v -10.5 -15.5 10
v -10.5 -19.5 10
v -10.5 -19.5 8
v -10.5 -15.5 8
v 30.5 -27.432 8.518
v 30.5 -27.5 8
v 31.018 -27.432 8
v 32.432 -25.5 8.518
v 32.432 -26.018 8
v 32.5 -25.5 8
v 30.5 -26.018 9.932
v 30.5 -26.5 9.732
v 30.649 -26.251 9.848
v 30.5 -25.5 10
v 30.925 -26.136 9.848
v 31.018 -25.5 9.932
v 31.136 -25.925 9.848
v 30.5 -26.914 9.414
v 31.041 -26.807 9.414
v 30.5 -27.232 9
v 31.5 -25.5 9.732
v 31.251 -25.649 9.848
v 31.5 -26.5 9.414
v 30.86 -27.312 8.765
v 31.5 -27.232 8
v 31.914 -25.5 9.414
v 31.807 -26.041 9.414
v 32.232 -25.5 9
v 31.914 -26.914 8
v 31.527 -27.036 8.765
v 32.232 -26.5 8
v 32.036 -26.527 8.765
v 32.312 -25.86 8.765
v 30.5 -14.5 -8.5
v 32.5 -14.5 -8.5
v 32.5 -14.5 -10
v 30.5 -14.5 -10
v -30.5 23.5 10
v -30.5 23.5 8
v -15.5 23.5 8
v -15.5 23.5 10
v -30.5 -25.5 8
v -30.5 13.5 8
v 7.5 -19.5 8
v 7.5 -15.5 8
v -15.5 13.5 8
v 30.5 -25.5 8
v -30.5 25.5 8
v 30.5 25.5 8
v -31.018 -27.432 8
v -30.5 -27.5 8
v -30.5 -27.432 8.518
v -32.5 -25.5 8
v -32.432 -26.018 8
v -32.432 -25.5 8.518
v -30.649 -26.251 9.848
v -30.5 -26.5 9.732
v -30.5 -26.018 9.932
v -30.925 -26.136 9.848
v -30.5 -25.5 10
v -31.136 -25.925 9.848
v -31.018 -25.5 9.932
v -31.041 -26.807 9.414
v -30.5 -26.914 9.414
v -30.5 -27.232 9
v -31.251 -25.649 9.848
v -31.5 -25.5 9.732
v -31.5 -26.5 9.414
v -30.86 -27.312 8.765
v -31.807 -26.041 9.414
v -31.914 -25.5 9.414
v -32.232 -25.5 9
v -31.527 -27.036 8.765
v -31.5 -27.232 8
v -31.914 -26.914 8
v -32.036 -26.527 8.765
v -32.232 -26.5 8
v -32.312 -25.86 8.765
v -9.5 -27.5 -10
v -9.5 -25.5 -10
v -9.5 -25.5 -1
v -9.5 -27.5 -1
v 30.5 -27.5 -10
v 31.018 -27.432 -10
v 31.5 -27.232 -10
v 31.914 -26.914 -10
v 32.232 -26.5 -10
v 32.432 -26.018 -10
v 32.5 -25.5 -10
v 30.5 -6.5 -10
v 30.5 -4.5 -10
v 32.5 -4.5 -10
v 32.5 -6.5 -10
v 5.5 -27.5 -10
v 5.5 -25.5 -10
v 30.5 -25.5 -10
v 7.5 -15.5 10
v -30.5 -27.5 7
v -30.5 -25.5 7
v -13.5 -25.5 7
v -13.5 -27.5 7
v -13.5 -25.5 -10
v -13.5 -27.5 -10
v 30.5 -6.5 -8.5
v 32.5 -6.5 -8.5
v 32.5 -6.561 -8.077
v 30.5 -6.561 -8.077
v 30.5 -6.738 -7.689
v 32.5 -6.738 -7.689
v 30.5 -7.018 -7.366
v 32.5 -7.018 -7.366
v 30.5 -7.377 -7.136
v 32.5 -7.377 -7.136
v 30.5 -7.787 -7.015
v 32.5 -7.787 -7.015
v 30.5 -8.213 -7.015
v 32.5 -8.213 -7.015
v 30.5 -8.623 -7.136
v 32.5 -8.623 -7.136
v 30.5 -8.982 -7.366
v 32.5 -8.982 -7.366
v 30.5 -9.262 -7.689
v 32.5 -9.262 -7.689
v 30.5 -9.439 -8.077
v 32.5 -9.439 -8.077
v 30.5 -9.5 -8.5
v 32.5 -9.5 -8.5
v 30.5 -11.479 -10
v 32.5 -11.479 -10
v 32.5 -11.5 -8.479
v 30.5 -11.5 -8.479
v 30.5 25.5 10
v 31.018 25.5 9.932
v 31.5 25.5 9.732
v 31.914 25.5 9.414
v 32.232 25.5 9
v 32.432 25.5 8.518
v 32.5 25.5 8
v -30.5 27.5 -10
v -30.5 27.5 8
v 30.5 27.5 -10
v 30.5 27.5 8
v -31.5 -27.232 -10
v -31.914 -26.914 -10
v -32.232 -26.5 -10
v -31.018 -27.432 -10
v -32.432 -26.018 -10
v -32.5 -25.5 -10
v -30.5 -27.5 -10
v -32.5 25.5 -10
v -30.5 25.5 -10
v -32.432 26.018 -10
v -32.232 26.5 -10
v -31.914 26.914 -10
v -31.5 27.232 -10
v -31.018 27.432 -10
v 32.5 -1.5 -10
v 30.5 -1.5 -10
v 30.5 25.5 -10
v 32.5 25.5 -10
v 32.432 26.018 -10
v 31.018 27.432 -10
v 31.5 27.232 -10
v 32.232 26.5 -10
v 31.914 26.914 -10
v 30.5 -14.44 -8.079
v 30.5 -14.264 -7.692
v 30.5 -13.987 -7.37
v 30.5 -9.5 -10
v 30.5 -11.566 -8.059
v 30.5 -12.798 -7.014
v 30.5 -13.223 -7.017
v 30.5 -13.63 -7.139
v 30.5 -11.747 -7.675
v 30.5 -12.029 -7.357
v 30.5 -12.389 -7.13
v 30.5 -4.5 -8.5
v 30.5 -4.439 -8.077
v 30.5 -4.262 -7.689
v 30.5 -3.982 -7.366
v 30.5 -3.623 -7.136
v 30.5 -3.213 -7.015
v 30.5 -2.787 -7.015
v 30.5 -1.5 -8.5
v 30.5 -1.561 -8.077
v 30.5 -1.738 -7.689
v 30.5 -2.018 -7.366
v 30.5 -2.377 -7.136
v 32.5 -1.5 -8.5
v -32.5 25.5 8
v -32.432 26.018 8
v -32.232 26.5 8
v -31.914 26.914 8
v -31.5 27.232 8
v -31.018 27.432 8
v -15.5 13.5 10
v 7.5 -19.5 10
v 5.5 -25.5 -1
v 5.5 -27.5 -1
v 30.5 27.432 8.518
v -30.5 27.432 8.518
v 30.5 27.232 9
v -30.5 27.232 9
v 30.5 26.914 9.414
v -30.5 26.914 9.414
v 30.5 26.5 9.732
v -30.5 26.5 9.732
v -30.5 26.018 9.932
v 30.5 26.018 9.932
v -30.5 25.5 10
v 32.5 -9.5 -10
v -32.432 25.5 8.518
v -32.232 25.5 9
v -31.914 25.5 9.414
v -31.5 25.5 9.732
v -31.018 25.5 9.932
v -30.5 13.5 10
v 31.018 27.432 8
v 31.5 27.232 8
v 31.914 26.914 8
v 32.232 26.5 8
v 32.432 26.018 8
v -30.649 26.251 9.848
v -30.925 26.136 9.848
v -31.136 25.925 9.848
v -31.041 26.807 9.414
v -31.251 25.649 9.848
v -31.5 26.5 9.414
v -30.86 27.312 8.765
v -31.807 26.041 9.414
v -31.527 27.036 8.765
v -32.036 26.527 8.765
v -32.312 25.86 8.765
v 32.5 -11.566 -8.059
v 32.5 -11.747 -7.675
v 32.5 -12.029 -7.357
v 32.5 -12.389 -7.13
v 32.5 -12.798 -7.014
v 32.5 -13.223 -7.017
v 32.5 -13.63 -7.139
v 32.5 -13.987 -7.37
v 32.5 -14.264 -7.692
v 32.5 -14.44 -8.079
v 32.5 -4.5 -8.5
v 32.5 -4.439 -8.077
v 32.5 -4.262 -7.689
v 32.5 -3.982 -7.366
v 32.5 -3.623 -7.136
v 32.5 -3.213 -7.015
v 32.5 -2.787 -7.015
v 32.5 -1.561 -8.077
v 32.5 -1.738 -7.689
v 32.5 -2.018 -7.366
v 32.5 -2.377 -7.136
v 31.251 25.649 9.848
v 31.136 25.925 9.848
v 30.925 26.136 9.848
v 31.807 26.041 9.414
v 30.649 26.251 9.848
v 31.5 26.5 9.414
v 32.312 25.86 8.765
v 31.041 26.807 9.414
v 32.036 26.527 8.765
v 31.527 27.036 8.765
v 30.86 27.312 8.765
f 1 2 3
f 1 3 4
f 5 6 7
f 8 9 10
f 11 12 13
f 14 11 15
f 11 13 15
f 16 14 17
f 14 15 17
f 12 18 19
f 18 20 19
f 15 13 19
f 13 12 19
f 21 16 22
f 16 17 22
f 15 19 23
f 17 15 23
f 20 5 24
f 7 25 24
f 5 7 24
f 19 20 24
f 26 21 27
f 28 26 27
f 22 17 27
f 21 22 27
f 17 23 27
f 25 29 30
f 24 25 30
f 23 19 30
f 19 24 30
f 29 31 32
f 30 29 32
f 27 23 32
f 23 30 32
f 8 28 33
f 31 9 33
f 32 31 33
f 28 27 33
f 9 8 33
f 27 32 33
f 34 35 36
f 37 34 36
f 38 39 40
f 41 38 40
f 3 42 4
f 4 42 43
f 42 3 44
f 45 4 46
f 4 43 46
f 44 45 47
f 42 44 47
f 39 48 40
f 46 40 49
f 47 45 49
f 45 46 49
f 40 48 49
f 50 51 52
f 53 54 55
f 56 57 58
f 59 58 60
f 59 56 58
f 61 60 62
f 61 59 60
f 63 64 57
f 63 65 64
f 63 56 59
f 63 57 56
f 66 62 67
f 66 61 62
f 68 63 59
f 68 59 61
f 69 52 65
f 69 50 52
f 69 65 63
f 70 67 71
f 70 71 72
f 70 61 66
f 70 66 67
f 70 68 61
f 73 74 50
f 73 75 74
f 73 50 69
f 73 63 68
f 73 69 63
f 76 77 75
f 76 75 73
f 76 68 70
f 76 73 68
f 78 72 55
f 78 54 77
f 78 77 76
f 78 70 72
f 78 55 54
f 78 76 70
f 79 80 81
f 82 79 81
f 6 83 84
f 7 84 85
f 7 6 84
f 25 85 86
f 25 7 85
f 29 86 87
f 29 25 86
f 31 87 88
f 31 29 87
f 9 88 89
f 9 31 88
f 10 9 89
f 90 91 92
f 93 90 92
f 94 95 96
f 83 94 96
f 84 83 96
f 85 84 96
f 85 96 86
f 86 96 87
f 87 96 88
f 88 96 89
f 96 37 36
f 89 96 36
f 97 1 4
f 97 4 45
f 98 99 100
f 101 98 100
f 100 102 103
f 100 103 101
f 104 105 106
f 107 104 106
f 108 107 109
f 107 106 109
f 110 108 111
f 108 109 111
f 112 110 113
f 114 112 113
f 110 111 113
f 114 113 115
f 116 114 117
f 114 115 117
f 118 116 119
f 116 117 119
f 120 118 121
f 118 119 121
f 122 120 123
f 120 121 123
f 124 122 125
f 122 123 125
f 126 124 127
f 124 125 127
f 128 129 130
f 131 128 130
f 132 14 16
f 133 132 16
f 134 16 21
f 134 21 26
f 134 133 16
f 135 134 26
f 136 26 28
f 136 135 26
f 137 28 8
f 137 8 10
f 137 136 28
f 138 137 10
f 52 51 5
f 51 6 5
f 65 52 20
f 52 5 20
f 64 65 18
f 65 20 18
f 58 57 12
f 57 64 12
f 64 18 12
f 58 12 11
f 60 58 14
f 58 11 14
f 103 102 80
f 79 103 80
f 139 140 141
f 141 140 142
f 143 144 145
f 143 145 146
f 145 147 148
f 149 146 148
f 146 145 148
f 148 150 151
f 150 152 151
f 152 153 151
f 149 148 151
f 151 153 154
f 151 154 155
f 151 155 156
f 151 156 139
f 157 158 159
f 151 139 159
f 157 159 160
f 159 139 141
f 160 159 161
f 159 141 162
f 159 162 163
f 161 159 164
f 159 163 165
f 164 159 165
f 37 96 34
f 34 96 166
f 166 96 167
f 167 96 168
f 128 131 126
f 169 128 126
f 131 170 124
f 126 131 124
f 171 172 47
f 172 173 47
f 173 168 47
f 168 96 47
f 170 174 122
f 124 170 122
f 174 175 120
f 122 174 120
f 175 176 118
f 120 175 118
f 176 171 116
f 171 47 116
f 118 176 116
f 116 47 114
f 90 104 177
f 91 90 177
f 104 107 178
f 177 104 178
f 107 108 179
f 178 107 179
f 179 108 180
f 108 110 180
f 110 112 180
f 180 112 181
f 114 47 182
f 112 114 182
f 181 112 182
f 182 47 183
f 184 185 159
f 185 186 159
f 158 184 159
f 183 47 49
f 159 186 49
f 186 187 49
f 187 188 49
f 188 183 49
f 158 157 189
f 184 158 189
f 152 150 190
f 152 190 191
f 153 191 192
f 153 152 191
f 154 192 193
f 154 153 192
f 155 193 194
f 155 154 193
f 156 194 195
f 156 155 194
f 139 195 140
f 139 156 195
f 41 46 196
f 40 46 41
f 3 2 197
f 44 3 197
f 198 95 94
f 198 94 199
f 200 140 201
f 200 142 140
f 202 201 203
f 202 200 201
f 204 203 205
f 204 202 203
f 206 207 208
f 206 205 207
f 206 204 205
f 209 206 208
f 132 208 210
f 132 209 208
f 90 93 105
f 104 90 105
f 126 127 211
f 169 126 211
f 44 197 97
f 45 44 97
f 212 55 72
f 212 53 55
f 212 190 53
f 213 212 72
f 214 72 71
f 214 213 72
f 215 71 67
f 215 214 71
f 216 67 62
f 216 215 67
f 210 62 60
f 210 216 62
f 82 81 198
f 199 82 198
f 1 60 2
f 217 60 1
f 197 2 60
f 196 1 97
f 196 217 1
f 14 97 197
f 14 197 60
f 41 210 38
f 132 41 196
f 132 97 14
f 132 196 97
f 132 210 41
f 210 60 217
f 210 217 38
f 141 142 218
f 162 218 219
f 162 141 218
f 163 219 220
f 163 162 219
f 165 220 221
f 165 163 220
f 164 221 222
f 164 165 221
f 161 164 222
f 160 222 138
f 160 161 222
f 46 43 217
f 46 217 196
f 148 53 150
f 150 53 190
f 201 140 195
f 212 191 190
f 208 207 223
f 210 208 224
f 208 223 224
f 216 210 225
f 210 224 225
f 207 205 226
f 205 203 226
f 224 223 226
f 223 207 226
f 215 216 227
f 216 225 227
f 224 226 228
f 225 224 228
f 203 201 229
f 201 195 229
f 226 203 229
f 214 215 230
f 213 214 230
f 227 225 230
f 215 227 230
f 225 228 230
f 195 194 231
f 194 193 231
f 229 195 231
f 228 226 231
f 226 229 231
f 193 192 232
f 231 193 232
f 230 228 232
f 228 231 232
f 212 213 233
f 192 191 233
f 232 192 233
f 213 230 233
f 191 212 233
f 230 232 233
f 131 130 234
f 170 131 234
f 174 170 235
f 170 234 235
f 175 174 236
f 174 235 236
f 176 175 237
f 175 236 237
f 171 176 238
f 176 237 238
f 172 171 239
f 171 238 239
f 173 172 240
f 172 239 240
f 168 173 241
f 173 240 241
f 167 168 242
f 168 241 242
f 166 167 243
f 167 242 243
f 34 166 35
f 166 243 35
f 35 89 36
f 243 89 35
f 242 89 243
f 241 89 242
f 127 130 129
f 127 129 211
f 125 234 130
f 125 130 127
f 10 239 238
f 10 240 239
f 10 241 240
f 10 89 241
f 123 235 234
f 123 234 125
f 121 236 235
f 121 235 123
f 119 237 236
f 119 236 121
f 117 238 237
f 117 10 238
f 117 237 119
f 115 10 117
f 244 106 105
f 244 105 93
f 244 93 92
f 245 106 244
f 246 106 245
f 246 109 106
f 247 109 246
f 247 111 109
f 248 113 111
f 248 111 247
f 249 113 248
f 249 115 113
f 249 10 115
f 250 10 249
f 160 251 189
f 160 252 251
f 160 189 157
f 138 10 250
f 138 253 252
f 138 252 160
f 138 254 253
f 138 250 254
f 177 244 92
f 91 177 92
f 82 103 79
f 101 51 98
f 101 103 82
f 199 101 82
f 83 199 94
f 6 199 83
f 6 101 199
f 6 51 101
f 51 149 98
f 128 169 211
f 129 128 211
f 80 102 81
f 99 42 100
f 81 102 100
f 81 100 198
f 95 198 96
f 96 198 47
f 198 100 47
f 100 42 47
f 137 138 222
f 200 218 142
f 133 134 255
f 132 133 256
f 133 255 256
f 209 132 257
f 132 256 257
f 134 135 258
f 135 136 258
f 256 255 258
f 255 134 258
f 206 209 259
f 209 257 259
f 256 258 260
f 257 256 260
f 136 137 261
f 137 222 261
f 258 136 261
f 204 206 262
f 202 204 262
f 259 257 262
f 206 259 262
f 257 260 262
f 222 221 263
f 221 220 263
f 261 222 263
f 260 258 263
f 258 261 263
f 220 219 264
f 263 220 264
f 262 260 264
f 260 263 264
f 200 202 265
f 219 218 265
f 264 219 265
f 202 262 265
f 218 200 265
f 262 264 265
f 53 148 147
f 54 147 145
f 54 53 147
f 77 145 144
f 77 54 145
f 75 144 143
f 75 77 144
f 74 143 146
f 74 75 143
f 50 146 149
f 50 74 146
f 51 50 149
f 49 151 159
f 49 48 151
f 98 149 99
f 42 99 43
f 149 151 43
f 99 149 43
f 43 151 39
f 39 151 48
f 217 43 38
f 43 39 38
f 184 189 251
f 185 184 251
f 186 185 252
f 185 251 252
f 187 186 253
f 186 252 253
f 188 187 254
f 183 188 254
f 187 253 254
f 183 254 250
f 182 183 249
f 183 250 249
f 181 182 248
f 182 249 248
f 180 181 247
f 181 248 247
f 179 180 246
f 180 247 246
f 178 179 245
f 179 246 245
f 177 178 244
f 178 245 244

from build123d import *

# Parameters (mm, degrees)
F0_W     = 65
F0_H     = 55
F1_DEPTH = 10
F2_T     = -2
F3_W     = 17
F3_H     = 17
F3_W_2   = 15
F3_H_2   = 9
F4_DEPTH = 27.5
F6_DEPTH = 25.4
F7_W     = 15
F7_H     = 10
F7_W_2   = 18
F7_H_2   = 4
F8_DEPTH = 12.7
F9_R     = 1.99999


# Not quite as in the source:
# - a fillet or chamfer is up to 0.001 mm smaller than in the source, because OpenCascade refuses the exact size


with BuildPart() as f1:
    # F0 (on Top) → F1 (new body, symmetric)
    with BuildSketch(Plane.XY):
        Rectangle(F0_W, F0_H)
    extrude(amount=F1_DEPTH, both=True)

    # F2
    f2_openings = [f1.faces().sort_by_distance(p)[0] for p in [
        (0, 0, -10),
    ]]
    offset(amount=F2_T, openings=f2_openings)

    # F3 (on Front) → F4 (cut, through all)
    with BuildSketch(Plane.XZ):
        with Locations((-22, -1.5)):
            Rectangle(F3_W, F3_H)
        with Locations((-2, -5.5)):
            Rectangle(F3_W_2, F3_H_2)
    extrude(amount=F4_DEPTH, mode=Mode.SUBTRACT)

    # F5 (on face) → F6 (cut)
    with BuildSketch(Plane.YZ.offset(32.5)):
        with BuildLine():
            Line((-14.5, -10), (-13, -10))
            ThreePointArc((-13, -10), (-14.0606601718, -9.5606601718), (-14.5, -8.5))
            Line((-14.5, -8.5), (-14.5, -10))
        make_face()
        with BuildLine():
            ThreePointArc((-13, -10), (-11.9393398282, -9.5606601718), (-11.5, -8.5))
            ThreePointArc((-11.5, -8.5), (-11.5000361058, -8.4895924938), (-11.5001444216, -8.4791854886))
            ThreePointArc((-11.5001444216, -8.4791854886), (-13.0104075062, -7.0000361058), (-14.5, -8.5))
            ThreePointArc((-14.5, -8.5), (-14.0606601718, -9.5606601718), (-13, -10))
        make_face()
        with BuildLine():
            ThreePointArc((-11.5001444216, -8.4791854886), (-11.5000361058, -8.4895924938), (-11.5, -8.5))
            ThreePointArc((-11.5, -8.5), (-11.9393398282, -9.5606601718), (-13, -10))
            Line((-13, -10), (-11.4790390489, -10))
            Line((-11.4790390489, -10), (-11.5001444216, -8.4791854886))
        make_face()
        with BuildLine():
            ThreePointArc((-6.5, -8.5), (-8, -7), (-9.5, -8.5))
            ThreePointArc((-9.5, -8.5), (-9.0606601747, -9.5606601688), (-8.0000000084, -10))
            ThreePointArc((-8.0000000084, -10), (-6.9393398312, -9.5606601747), (-6.5, -8.5))
        make_face()
        with BuildLine():
            Line((-9.5, -8.5), (-9.5, -10))
            Line((-9.5, -10), (-8.0000000084, -10))
            ThreePointArc((-8.0000000084, -10), (-9.0606601747, -9.5606601688), (-9.5, -8.5))
        make_face()
        with BuildLine():
            ThreePointArc((-6.5, -8.5), (-6.9393398312, -9.5606601747), (-8.0000000084, -10))
            Line((-8.0000000084, -10), (-6.5, -10))
            Line((-6.5, -10), (-6.5, -8.5))
        make_face()
        with BuildLine():
            ThreePointArc((-1.5, -8.5), (-3, -7), (-4.5, -8.5))
            ThreePointArc((-4.5, -8.5), (-4.0606601718, -9.5606601718), (-3, -10))
            ThreePointArc((-3, -10), (-1.9393398282, -9.5606601718), (-1.5, -8.5))
        make_face()
        with BuildLine():
            Line((-4.5, -8.5), (-4.5, -10))
            Line((-4.5, -10), (-3, -10))
            ThreePointArc((-3, -10), (-4.0606601718, -9.5606601718), (-4.5, -8.5))
        make_face()
        with BuildLine():
            ThreePointArc((-1.5, -8.5), (-1.9393398282, -9.5606601718), (-3, -10))
            Line((-3, -10), (-1.5, -10))
            Line((-1.5, -10), (-1.5, -8.5))
        make_face()
    extrude(amount=-F6_DEPTH, mode=Mode.SUBTRACT)

    # F7 (on face) → F8 (cut, symmetric)
    with BuildSketch(Plane.XY.offset(10)):
        with Locations((-23, 18.5)):
            Rectangle(F7_W, F7_H)
        with Locations((-1.5, -17.5)):
            Rectangle(F7_W_2, F7_H_2)
    extrude(amount=F8_DEPTH, both=True, mode=Mode.SUBTRACT)

    # F9 (radius 2 in the source; OpenCascade refuses exactly that, so slightly less here)
    f9_edges = [f1.edges().sort_by_distance(p)[0] for p in [
        (-32.5, -27.5, 0),
        (32.5, -27.5, 0),
        (32.5, 27.5, 0),
        (-32.5, 27.5, 0),
        (0, -27.5, 10),
        (32.5, 0, 10),
        (0, 27.5, 10),
        (-32.5, 0, 10),
    ]]
    fillet(f9_edges, radius=F9_R)


solid = f1.part
